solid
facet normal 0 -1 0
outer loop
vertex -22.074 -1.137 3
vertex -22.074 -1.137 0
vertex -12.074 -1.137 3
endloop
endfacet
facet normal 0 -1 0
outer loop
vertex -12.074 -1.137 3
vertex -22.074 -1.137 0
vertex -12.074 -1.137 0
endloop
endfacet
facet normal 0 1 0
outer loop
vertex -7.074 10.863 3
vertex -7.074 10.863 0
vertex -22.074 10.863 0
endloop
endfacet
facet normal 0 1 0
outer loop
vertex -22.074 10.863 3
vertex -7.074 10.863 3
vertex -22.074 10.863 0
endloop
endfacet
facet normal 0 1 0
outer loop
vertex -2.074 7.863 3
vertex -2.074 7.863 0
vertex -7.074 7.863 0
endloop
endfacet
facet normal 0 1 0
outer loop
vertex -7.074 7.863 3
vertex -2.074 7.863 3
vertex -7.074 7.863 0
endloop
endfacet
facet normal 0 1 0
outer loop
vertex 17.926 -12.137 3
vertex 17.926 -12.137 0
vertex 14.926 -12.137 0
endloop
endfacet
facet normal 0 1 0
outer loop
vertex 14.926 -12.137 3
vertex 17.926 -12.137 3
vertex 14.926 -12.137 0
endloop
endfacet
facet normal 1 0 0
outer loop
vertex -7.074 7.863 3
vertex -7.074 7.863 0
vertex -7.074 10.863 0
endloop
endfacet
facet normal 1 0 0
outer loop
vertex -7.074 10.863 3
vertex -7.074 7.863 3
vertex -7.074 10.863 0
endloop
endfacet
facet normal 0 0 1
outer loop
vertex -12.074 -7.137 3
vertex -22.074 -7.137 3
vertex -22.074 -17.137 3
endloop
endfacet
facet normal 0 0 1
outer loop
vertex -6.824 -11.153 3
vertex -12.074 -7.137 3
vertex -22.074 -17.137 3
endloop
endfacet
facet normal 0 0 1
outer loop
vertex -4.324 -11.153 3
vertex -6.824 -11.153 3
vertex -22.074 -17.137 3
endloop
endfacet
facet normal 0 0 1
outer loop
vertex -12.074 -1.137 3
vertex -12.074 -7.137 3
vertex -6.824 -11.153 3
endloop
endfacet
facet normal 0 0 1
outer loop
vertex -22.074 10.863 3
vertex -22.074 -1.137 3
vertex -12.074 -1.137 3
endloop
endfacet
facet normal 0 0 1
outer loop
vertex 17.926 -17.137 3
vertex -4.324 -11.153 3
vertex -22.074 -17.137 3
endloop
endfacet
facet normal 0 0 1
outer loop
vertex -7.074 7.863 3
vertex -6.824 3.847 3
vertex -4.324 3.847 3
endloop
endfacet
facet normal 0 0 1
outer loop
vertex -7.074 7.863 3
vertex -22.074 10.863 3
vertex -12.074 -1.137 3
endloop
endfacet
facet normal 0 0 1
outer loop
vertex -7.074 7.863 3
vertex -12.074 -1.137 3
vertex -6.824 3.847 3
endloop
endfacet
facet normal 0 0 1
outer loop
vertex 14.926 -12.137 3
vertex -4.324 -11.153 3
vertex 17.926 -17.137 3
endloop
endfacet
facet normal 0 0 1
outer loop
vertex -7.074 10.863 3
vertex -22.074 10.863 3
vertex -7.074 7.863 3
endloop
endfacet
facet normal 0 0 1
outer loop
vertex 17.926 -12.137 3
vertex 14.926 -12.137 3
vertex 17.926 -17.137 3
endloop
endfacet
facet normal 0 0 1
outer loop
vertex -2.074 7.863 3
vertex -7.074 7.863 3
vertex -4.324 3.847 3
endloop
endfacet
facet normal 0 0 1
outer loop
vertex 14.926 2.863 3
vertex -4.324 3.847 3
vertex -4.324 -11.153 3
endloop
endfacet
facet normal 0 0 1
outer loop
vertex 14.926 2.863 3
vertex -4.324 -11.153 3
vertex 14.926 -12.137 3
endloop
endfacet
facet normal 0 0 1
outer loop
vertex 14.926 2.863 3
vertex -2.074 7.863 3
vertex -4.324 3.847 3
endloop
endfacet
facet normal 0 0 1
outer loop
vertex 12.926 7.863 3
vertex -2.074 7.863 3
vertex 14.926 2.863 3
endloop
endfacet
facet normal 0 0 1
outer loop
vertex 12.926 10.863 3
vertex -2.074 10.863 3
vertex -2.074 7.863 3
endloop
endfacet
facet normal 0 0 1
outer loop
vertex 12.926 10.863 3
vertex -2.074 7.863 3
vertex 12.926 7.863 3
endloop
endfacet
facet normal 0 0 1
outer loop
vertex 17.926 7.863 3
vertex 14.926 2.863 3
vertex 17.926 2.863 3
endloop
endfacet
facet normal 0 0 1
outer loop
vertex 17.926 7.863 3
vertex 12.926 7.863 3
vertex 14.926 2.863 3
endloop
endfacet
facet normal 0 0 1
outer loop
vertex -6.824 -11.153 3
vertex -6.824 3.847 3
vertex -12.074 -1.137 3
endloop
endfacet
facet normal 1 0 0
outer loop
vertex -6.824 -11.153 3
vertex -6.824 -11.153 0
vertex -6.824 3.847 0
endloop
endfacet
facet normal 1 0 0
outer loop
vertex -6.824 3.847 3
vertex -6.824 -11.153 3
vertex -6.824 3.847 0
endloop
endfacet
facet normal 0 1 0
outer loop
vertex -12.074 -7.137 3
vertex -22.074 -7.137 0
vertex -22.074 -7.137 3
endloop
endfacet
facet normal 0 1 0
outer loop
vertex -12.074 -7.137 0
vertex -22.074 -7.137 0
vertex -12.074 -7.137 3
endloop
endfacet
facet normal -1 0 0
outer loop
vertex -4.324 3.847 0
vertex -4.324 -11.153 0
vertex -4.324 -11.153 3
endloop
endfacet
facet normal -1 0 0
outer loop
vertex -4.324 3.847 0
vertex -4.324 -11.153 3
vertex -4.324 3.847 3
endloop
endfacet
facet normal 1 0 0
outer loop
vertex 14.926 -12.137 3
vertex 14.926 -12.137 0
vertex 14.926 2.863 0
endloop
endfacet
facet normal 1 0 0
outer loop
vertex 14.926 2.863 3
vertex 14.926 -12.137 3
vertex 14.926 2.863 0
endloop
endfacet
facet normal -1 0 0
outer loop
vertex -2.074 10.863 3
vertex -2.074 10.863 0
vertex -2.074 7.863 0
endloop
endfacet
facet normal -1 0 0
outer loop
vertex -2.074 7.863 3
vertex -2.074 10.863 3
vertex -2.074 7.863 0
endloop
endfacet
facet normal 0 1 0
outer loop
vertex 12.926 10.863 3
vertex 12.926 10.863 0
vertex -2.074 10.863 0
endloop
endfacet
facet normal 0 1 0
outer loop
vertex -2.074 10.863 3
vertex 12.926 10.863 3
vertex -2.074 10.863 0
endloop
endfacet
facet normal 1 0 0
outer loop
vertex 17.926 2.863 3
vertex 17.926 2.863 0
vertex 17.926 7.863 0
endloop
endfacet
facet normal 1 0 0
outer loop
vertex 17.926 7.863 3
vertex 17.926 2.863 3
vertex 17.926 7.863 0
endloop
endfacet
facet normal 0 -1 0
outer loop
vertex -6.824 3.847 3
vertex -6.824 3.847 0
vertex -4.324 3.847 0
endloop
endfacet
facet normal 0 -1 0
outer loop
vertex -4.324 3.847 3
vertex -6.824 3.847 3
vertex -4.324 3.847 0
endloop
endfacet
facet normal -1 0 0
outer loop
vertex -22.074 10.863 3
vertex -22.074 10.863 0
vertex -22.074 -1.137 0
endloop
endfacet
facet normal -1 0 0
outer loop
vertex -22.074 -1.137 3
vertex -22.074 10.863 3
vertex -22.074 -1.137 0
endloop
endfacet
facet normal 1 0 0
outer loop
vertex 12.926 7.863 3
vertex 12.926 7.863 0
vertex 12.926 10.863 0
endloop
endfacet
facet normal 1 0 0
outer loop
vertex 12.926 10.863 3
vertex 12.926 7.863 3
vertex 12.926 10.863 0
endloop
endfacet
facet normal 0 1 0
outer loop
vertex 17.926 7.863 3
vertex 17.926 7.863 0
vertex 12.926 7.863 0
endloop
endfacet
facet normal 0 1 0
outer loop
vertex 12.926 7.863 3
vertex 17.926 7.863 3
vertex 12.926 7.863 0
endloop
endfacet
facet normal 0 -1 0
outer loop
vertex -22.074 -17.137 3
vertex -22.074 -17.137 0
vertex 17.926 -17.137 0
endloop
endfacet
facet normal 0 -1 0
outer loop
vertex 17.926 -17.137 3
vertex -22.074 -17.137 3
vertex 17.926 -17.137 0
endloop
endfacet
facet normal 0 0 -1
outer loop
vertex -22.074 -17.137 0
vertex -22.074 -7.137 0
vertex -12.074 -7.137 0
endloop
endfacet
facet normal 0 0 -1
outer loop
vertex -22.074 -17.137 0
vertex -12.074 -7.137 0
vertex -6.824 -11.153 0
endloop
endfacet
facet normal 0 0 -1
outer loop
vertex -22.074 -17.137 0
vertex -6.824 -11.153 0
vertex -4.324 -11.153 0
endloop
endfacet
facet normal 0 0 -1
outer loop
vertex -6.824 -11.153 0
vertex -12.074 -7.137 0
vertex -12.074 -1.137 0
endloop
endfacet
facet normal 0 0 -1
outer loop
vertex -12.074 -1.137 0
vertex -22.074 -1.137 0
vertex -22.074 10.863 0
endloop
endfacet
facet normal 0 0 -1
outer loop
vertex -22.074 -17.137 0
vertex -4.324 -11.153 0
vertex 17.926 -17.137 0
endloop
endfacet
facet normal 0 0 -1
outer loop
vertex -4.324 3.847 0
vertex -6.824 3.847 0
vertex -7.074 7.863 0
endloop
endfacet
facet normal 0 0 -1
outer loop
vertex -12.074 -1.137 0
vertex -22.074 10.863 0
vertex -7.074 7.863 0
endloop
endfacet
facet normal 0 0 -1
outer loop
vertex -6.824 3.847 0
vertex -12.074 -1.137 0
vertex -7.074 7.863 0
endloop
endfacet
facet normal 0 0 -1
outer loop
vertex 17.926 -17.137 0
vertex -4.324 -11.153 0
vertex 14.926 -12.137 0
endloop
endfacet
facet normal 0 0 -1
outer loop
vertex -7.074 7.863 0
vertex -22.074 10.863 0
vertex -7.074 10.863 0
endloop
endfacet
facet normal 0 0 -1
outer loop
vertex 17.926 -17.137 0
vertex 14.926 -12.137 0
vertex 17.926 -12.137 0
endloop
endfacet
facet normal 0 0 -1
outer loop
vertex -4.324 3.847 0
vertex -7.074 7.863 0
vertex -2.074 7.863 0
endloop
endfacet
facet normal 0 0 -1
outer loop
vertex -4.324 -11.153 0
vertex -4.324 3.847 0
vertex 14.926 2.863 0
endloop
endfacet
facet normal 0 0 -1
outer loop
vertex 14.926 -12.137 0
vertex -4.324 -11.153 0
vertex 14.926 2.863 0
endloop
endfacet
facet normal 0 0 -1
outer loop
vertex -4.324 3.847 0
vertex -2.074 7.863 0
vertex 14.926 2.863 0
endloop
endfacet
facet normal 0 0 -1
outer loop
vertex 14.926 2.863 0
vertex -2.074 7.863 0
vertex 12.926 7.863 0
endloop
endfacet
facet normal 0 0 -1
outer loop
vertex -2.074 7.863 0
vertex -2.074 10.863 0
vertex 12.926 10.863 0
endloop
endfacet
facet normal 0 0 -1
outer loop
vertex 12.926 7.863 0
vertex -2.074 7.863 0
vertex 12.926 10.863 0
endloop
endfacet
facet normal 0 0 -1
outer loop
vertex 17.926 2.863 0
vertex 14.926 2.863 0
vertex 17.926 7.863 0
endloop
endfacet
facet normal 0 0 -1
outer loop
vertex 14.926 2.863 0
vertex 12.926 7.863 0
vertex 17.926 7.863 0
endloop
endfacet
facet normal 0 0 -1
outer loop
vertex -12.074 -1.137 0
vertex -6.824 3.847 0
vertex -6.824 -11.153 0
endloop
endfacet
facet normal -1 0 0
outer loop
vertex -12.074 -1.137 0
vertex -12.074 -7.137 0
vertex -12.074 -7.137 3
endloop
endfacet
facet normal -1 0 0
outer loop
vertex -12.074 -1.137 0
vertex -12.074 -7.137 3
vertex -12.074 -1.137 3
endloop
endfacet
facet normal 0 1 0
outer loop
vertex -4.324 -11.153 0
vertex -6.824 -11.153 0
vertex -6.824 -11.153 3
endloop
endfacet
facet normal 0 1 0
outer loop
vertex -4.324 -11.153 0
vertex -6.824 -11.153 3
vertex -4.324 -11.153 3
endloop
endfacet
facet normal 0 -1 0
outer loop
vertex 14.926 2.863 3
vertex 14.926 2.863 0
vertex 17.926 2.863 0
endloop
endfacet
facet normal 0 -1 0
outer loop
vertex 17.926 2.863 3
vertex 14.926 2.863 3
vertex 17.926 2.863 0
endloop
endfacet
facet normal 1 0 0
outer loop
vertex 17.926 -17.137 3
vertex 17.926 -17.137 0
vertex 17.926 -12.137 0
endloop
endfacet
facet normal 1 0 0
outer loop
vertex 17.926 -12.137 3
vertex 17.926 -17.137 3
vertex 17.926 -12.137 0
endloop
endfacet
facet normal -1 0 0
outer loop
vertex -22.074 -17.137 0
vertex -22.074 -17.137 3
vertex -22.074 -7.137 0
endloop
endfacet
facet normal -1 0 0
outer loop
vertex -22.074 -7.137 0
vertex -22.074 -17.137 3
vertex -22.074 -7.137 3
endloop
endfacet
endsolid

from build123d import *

# Parameters (mm, degrees)
SKETCH2_W           = 15
SKETCH2_H           = 6
SKETCH2_W_2         = 2.5
SKETCH2_H_2         = 15
BOSS_EXTRUDE1_DEPTH = 3
CUT_EXTRUDE1_DEPTH  = 4


with BuildPart() as part:
    # Sketch2 → Boss-Extrude1 (new body)
    with BuildSketch(Plane.XY):
        Polygon((-22.073806452, 10.862903226), (-22.073806452, 7.862903226), (-32.073806452, 7.862903226), (-32.073806452, -17.137096774), (17.926193548, -17.137096774), (17.926193548, -12.137096774), (14.926193548, -12.137096774), (14.926193548, 2.862903226), (17.926193548, 2.862903226), (17.926193548, 7.862903226), (12.926193548, 7.862903226), (12.926193548, 10.862903226), (-2.073806452, 10.862903226), (-2.073806452, 7.862903226), (-7.073806452, 7.862903226), (-7.073806452, 10.862903226), align=None)
        with Locations((-19.573806452, -4.137096774)):
            Rectangle(SKETCH2_W, SKETCH2_H, mode=Mode.SUBTRACT)
        with Locations((-5.573806452, -3.653225806)):
            Rectangle(SKETCH2_W_2, SKETCH2_H_2, mode=Mode.SUBTRACT)
    extrude(amount=BOSS_EXTRUDE1_DEPTH)

    # Sketch4 → Cut-Extrude1 (cut, through all)
    with BuildSketch(Plane.XY.offset(3)):
        Polygon((-22.073806452, 1.862903226), (-22.073806452, 7.862903226), (-32.073806452, 7.862903226), (-32.073806452, 1.862903226), (-32.073806452, -17.137096774), (-22.073806452, -17.137096774), align=None)
    extrude(amount=-CUT_EXTRUDE1_DEPTH, mode=Mode.SUBTRACT)


solid = part.part
